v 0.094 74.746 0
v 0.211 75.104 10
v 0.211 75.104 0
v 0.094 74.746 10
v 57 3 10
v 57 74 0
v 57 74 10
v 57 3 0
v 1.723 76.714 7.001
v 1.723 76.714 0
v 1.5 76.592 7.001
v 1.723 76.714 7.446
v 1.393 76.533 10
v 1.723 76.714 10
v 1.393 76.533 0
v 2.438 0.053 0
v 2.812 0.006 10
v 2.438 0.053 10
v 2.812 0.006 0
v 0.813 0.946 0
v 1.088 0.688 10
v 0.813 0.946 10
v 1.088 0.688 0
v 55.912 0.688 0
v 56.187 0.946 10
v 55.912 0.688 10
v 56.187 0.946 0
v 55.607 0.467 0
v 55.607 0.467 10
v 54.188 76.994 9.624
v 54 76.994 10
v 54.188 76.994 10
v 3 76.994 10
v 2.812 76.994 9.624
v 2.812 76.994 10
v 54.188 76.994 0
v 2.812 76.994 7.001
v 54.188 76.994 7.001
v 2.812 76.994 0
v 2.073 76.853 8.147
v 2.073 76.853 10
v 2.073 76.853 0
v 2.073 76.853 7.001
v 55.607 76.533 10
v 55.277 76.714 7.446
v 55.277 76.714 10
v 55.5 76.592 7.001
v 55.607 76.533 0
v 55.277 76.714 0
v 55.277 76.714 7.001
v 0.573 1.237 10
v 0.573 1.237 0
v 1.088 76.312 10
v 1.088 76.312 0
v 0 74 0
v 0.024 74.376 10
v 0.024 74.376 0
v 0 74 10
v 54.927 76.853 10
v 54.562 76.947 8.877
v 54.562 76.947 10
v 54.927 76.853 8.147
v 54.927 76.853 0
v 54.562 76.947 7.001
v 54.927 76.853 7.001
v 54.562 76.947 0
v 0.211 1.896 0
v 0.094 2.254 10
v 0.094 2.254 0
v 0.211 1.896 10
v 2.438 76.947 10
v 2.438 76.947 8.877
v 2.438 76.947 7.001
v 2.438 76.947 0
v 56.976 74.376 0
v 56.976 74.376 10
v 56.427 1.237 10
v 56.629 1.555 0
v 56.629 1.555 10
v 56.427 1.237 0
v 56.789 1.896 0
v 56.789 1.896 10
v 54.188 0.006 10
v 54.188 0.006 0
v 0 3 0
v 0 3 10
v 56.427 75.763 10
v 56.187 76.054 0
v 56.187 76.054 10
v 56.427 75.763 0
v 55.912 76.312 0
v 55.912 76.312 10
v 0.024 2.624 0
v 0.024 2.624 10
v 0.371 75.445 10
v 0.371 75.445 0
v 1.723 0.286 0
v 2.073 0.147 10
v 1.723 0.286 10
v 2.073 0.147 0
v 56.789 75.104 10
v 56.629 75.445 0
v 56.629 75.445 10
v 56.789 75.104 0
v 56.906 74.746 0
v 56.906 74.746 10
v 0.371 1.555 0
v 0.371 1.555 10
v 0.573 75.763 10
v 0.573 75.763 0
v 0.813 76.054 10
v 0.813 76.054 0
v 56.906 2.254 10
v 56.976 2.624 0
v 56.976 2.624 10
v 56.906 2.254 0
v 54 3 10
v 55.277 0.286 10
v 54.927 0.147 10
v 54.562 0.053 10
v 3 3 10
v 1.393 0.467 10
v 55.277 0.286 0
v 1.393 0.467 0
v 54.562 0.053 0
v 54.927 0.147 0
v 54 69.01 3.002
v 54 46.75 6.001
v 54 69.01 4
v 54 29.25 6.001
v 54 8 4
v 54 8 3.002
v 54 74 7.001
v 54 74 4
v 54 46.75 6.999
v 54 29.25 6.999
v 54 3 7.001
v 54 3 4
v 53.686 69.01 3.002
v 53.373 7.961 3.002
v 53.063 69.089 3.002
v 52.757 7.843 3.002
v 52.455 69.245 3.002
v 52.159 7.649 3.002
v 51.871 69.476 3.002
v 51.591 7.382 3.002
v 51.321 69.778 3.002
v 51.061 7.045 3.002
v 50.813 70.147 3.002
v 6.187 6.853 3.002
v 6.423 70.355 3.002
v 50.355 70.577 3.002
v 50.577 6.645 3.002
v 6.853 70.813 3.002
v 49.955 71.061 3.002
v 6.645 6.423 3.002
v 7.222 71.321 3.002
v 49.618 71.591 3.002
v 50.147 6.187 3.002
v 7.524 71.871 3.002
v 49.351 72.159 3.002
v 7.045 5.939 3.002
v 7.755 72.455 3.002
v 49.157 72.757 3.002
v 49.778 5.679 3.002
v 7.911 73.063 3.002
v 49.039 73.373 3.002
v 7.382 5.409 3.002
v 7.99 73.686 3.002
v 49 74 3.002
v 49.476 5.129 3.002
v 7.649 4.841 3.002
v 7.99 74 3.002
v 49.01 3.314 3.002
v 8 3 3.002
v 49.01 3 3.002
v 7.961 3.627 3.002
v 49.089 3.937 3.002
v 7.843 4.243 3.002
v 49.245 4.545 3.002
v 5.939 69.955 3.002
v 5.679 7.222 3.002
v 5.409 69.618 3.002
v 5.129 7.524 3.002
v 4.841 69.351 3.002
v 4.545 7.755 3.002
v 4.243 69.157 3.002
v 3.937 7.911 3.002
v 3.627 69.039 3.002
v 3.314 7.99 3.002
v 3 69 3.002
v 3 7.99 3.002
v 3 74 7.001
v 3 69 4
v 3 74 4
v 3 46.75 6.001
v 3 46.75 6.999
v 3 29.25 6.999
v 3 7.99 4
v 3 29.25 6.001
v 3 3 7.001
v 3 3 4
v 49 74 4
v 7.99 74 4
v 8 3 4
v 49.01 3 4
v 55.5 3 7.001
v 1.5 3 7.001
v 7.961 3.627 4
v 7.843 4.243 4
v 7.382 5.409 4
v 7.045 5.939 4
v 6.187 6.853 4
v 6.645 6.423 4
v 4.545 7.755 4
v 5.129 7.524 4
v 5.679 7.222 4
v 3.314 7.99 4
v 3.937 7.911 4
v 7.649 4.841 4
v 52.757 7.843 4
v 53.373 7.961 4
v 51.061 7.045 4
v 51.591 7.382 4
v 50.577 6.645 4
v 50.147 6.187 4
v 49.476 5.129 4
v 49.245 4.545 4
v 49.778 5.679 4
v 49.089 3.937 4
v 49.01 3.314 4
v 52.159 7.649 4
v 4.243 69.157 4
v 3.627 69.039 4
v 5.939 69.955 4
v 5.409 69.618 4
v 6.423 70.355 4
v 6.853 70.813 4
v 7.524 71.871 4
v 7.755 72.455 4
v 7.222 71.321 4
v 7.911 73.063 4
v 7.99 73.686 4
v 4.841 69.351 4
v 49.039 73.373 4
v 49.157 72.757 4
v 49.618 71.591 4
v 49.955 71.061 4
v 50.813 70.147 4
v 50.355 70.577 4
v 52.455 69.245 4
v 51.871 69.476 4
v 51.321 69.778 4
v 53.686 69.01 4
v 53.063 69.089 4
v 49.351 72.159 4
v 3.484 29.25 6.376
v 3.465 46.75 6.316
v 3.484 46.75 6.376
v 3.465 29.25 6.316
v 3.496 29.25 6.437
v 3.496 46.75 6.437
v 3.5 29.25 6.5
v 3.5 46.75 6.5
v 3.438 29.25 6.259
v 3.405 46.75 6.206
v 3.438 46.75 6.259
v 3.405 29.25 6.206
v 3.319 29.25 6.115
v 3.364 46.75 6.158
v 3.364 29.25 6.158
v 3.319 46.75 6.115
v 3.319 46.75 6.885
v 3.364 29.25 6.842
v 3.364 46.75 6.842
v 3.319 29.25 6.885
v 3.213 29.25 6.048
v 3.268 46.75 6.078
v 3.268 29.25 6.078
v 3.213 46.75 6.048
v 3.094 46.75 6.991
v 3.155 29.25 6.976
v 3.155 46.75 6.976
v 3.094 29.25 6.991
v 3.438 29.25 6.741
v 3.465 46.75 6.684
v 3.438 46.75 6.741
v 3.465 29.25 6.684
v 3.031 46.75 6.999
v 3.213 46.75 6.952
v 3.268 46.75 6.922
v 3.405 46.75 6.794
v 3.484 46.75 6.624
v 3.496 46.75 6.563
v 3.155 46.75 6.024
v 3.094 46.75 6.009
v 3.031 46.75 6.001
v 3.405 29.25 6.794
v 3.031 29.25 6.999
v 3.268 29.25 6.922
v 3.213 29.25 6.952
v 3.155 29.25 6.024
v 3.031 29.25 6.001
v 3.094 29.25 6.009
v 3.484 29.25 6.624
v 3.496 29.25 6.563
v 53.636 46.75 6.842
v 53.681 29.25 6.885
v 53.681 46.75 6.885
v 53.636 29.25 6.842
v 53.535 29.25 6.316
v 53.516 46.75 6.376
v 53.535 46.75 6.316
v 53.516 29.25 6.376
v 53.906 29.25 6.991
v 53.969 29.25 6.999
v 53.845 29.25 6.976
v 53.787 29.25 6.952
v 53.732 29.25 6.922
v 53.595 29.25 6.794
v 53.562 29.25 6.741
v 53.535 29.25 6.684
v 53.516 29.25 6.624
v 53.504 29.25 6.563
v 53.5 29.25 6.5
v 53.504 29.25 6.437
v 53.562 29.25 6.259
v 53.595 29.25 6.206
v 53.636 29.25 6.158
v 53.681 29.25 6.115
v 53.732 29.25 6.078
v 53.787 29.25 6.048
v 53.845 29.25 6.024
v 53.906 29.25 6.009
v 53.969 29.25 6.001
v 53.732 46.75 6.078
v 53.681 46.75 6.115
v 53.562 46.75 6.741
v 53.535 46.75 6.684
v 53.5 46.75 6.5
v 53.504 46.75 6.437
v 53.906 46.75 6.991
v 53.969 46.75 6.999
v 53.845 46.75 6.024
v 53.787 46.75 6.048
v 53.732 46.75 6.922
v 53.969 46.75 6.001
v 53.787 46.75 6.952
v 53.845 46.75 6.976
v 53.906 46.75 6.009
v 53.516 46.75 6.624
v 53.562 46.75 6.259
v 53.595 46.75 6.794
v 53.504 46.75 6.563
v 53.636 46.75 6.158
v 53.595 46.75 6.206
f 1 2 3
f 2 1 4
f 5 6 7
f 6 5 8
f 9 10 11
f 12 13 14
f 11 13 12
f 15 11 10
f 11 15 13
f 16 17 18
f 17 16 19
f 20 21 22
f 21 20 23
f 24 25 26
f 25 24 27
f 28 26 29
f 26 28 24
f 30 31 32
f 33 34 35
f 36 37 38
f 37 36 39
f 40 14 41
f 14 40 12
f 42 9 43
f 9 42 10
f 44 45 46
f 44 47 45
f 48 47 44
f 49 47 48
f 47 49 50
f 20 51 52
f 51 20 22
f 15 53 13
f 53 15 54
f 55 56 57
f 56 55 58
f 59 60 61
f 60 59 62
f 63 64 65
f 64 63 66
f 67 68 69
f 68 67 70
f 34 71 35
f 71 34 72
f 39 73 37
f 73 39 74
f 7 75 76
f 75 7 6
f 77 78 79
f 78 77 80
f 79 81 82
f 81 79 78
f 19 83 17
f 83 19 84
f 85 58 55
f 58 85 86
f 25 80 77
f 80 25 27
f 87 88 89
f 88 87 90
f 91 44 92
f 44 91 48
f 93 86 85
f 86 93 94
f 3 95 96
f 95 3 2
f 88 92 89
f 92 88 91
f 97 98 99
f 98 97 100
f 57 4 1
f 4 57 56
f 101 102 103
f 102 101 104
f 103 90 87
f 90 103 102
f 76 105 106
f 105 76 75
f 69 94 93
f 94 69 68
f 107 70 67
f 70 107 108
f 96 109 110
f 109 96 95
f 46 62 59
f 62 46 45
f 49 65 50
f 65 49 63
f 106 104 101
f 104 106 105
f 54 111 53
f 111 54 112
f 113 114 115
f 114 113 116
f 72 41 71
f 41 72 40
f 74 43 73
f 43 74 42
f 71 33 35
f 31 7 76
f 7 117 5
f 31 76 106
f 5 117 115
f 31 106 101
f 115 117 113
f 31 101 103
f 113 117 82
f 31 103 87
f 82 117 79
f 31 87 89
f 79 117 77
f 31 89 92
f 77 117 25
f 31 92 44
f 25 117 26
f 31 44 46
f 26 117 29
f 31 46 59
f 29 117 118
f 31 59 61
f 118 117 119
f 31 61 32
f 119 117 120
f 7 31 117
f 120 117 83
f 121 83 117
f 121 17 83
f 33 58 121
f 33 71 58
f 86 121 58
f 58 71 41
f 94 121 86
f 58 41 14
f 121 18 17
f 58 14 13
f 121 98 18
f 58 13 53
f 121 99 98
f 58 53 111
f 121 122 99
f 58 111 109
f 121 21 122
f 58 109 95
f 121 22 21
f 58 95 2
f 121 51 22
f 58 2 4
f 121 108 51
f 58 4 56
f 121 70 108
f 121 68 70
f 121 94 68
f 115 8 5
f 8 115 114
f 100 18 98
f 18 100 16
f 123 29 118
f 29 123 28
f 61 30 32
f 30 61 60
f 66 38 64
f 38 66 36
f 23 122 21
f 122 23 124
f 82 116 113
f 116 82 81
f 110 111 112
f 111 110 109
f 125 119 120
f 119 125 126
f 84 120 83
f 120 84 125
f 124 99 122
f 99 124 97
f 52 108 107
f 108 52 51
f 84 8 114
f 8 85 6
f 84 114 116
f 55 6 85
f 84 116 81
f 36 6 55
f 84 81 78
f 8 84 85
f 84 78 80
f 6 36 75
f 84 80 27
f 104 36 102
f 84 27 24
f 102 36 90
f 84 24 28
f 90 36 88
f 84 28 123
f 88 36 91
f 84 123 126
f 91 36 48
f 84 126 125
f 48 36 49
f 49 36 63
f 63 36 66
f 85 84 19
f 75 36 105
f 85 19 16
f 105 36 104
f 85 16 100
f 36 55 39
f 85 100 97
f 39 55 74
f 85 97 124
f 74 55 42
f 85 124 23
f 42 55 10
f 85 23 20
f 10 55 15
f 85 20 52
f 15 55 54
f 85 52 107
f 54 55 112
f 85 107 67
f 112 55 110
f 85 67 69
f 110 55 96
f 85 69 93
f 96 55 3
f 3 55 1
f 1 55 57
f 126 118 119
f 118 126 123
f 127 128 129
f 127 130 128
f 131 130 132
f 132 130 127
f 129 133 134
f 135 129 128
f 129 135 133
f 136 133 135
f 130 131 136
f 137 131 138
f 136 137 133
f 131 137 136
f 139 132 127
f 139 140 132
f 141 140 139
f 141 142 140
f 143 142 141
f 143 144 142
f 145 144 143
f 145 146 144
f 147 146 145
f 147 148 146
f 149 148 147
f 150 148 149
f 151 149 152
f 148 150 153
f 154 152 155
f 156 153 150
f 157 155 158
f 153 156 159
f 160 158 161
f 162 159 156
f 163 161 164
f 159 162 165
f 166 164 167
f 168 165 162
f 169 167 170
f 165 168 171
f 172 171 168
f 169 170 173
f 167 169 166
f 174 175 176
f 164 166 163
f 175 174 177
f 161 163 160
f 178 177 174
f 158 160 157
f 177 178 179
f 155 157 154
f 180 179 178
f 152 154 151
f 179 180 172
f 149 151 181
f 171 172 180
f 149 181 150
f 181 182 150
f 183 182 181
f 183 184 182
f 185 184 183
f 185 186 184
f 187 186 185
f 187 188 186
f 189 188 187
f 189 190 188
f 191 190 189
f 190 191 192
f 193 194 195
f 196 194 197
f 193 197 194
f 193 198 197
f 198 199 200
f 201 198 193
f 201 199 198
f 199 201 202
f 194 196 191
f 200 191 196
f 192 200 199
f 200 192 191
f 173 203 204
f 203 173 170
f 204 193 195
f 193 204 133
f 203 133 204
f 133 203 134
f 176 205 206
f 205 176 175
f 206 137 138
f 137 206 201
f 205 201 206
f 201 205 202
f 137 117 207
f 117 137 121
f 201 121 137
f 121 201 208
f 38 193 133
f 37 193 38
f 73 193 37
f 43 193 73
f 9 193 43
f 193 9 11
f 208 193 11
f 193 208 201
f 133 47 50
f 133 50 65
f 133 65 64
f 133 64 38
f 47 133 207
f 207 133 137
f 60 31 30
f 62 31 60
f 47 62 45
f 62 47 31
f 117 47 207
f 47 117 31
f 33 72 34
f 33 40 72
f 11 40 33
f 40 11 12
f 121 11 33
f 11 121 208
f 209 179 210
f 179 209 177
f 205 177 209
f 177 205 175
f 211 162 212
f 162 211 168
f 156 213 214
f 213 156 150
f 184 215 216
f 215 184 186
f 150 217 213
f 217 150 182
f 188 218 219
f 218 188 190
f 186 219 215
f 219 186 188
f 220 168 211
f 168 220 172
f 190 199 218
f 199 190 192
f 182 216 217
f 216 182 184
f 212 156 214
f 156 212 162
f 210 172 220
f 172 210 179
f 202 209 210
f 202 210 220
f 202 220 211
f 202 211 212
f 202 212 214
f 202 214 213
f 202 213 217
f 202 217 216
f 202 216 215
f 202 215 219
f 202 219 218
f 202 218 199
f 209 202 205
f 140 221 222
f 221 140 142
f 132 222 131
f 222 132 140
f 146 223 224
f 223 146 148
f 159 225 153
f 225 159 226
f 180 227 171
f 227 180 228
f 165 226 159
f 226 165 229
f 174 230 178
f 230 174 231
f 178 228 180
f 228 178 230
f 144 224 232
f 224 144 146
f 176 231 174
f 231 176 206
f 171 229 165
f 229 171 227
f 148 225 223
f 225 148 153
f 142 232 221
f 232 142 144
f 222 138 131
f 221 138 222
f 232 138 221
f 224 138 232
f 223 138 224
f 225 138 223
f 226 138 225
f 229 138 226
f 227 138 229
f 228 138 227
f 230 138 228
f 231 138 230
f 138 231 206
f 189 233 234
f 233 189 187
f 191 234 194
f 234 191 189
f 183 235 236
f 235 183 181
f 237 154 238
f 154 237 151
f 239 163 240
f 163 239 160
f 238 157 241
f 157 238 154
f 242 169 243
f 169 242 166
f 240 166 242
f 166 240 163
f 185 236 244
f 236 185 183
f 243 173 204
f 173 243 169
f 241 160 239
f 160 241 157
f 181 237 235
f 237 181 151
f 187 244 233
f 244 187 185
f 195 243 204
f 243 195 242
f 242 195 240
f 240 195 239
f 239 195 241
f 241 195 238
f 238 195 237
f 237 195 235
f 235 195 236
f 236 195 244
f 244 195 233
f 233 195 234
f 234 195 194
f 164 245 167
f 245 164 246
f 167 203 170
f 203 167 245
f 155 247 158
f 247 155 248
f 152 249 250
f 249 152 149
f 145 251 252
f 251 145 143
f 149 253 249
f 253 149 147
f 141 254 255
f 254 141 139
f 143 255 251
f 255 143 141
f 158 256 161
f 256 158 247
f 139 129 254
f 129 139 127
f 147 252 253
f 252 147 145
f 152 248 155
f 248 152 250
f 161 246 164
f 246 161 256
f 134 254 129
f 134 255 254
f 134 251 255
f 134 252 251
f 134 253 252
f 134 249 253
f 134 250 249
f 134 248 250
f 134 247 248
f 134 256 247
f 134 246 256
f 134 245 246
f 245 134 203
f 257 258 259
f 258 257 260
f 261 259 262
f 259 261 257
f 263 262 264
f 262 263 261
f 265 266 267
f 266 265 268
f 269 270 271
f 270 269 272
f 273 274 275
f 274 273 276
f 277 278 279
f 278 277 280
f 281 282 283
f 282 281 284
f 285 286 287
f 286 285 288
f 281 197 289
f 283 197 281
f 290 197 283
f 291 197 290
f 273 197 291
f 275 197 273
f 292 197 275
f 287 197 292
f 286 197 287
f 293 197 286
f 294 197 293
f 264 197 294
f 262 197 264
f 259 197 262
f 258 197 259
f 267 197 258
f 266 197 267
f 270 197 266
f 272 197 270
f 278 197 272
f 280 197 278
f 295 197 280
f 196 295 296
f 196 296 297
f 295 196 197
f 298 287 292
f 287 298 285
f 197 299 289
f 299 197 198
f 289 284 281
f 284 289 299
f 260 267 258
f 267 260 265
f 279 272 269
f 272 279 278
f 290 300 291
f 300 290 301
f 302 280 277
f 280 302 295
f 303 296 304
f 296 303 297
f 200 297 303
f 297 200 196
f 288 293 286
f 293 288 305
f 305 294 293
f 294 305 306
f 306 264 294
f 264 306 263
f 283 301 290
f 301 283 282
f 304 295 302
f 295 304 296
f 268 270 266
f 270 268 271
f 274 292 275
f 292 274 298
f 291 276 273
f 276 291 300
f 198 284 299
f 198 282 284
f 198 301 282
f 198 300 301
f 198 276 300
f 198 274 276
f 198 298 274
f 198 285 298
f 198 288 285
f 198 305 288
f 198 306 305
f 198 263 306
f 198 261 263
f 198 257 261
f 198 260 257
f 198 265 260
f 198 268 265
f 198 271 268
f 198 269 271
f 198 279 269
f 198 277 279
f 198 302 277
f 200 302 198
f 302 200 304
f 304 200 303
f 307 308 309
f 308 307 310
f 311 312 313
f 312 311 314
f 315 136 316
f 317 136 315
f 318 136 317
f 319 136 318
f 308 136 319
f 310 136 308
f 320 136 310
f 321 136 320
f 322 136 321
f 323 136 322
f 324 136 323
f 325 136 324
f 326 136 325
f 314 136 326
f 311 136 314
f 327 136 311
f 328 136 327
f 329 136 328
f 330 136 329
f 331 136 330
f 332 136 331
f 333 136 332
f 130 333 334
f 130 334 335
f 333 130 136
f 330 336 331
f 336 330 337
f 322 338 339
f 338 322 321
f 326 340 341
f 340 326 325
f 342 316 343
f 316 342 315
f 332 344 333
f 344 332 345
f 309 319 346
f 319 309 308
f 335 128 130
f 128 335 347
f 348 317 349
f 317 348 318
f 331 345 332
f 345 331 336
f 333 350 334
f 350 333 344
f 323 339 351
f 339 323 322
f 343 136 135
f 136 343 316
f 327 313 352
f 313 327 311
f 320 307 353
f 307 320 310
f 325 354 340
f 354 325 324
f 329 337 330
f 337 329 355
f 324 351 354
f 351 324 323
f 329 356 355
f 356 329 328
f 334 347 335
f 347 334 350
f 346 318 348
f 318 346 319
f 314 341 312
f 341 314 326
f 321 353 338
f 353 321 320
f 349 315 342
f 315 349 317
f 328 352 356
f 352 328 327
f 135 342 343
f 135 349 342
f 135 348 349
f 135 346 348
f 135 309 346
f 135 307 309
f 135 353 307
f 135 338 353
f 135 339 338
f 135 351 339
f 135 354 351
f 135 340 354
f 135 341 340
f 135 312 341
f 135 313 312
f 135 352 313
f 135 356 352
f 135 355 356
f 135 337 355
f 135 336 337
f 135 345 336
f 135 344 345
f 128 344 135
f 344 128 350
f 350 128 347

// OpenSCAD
// file: project_box.scad
/* Project box

   A parametric box for electronics projects using perforated circuit boards. The
   board is held above the bottom of the box by four corner supports, and snaps
   into place to hold it snugly while allowing easy removal.

   Shapes provided as children will be used as cutouts, translated to the origin
   point of the top of the circuit board. Modules are provided for cutting out
   two-dimensional shapes from each wall face as well as the lid.
*/

$fn=50;

mode = "case";         // ["case", "lid", "all"]
board_x = 50;
board_y = 70;
board_thickness = 1;   // [1:10]
clearance_above = 20;  // [5:50]
clearance_below = 10;  // [5:50]
fit_tolerance = 0.5;
corner_radius=3;       // [1:10]
support_radius=5;      // [1:10]
wall_width=3;          // [3:10]

module _rounded_box(box, r) {
  hull() {
    translate([0 + r,0 + r,0])
      cylinder(h=box.z,r=r);
    translate([box.x - r,0 + r,0])
      cylinder(h=box.z, r=r);
    translate([box.x - r,box.y - r,0])
      cylinder(h=box.z, r=r);
    translate([0 + r,box.y - r,0])
      cylinder(h=box.z, r=r);
  }
}

module corner_post(h, r) {
  intersection() {
    translate([-0.001,-0.001,-0.001])
      cube([r*1.1, r*1.1, h*1.2]);
    cylinder(h=h, r=r);
  }
}

module lid_base(dimensions, slot_depth=1.5) {
  polyhedron([// bottom face
              [0, 0, 0],
              [dimensions.x, 0, 0],
              [dimensions.x, dimensions.y, 0],
              [0, dimensions.y, 0],
              // top face
              [slot_depth, 0, dimensions.z],
              [dimensions.x - slot_depth, 0, dimensions.z],
              [dimensions.x - slot_depth, dimensions.y, dimensions.z],
              [slot_depth, dimensions.y, dimensions.z]],
             [[0,1,2,3],
              [4,5,1,0],
              [7,6,5,4],
              [5,6,2,1],
              [6,7,3,2],
              [7,4,0,3]]);
}

module lid(dimensions, slot_depth=1.5, wall_width=3, fit_tolerance=0.5) {
  indent_width = dimensions.x / 4;
  difference() {
    union() {
      lid_base([dimensions.x, dimensions.y, dimensions.z], slot_depth);
      // locking tab
      translate([dimensions.x / 2 - indent_width / 2 - fit_tolerance,
                 dimensions.y - wall_width - fit_tolerance,
                 0])
        rotate([0, 90, 0])
        cylinder(h=dimensions.x / 4, r=2*fit_tolerance);
    }
    // pull handle
    translate([dimensions.x / 2 - indent_width / 2 - fit_tolerance,
               dimensions.y - wall_width + fit_tolerance + 0.001,
               -0.001]) {
      cube([indent_width,wall_width - 2 * fit_tolerance,0.6 * dimensions.z]);
      cube([indent_width,2 + wall_width - 2 * fit_tolerance,0.3 * dimensions.z]);
    }
  }
}

module project_box(box,
                   below=10,
                   board_thickness=1,
                   fit_tolerance=0.5,
                   corner_radius=3,
                   support_radius=5,
                   wall_width=3,
                   mode="case") {
  internal_width = box.x + (fit_tolerance * 2);  // tolerance on either side
  internal_depth = box.y + (fit_tolerance * 2);  // tolerance on either side

  internal_height = (fit_tolerance      // top tolerance
                     + box.z            // project height
                     + board_thickness  // board height
                     + below            // bottom clearance
                     + fit_tolerance);  // bottom tolerance

  lid_width = internal_width + wall_width;  // Extends halfway into each side wall
  lid_depth = internal_depth + wall_width;  // Extends out of one wall
  lid_height = wall_width;         // Replaces most of the top wall

  // case
  if ((mode == "case") || (mode == "all")) {
    difference() {
      union() {
        // hollow shell
        difference() {
          _rounded_box([internal_width + (wall_width * 2),
                        internal_depth + (wall_width * 2),
                        internal_height + (wall_width * 2)],
                       r=corner_radius);
          translate([wall_width,wall_width,wall_width + 0.002])
            cube([internal_width, internal_depth, internal_height]);
          // lid slot
          translate([wall_width / 2, wall_width, internal_height + wall_width + 0.001]) {
            lid_base([lid_width, lid_depth, lid_height]);
          }
        }
        // supports
        translate([wall_width,wall_width,wall_width]) {
          translate([0,0,0])
            corner_post(h=below, r=support_radius);
          translate([internal_width, 0, 0])
            rotate([0,0,90])
            corner_post(h=below, r=support_radius);
          translate([0,internal_depth, 0])
            rotate([0,0,270])
            corner_post(h=below, r=support_radius);
          translate([internal_width, internal_depth, 0])
            rotate([0,0,180])
            corner_post(h=below, r=support_radius);
        }

        // locking nubs
        translate([wall_width,wall_width,wall_width]) {
          nub_size = fit_tolerance * 2;
          nub_width = box.y / 4;
          nub_height = below + board_thickness + (nub_size/2) + (fit_tolerance*2);
          translate([0,box.y / 2 - nub_width / 2,nub_height])
            rotate([270,0,0])
            cylinder(h=nub_width, r=nub_size/2);
          translate([internal_width,box.y / 2 - nub_width / 2,nub_height])
            rotate([270,0,0])
            cylinder(h=nub_width, r=nub_size/2);
        }
        if (mode == "all") {
          // lid
          translate([wall_width / 2 + fit_tolerance,
                     wall_width + fit_tolerance,
                     internal_height + wall_width + fit_tolerance]) {
            lid([lid_width - (fit_tolerance * 2),
                 lid_depth - (fit_tolerance * 2),
                 lid_height - (fit_tolerance * 2)]);
          }
        }
      }
      // cutouts
      translate([wall_width + fit_tolerance,
                 wall_width + fit_tolerance,
                 fit_tolerance + wall_width + below + board_thickness])
        children();
    }
  } else if (mode == "lid") {
    // Flip the lid and translate it into place for printing
    translate([lid_width - (fit_tolerance * 2),0,lid_height - (fit_tolerance * 2)]) {
      rotate([0, 180, 0]) {
        difference() {
          lid([lid_width - (fit_tolerance * 2),
               lid_depth - (fit_tolerance * 2),
               lid_height - (fit_tolerance * 2)]);
          translate([wall_width + fit_tolerance, wall_width + fit_tolerance, -0.001])
            children();
        }
      }
    }
  }
}

module cutout_front(box, wall_width=3, fit_tolerance=0.5) {
  rotate([90, 0, 0])
    linear_extrude(height=wall_width + fit_tolerance + 0.001)
    children(0);
}

module cutout_back(box, wall_width=3, fit_tolerance=0.5)  {
  translate([box.x,box.y,0])
    rotate([90, 0, 180])
    linear_extrude(height=wall_width + fit_tolerance + .001)
    children(0);
}

module cutout_right(box, wall_width=3, fit_tolerance=0.5) {
  translate([box.x,0,0])
    rotate([90, 0, 90])
    linear_extrude(height=wall_width + fit_tolerance + 0.001)
    children(0);
}

module cutout_left(box, wall_width=3, fit_tolerance=0.5) {
  translate([0, box.y, 0])
    rotate([90, 0, 270])
    linear_extrude(height=wall_width + fit_tolerance + 0.001)
    children(0);
}

module cutout_top(box, wall_width=3, fit_tolerance=0.5) {
  translate([0, 0, box.z])
    linear_extrude(height=wall_width + fit_tolerance + 0.001)
    children(0);
}

project_box([board_x, board_y, clearance_above],
            below=clearance_below,
            board_thickness=board_thickness,
            fit_tolerance=fit_tolerance,
            corner_radius=corner_radius,
            support_radius=support_radius,
            wall_width=wall_width,
            mode=mode);
// main file
use <project_box.scad>
$fn=50;

mode = "case"; // ["case", "lid", "all"]

project_box([50, 70, 1],
            below=1,
            mode=mode);
